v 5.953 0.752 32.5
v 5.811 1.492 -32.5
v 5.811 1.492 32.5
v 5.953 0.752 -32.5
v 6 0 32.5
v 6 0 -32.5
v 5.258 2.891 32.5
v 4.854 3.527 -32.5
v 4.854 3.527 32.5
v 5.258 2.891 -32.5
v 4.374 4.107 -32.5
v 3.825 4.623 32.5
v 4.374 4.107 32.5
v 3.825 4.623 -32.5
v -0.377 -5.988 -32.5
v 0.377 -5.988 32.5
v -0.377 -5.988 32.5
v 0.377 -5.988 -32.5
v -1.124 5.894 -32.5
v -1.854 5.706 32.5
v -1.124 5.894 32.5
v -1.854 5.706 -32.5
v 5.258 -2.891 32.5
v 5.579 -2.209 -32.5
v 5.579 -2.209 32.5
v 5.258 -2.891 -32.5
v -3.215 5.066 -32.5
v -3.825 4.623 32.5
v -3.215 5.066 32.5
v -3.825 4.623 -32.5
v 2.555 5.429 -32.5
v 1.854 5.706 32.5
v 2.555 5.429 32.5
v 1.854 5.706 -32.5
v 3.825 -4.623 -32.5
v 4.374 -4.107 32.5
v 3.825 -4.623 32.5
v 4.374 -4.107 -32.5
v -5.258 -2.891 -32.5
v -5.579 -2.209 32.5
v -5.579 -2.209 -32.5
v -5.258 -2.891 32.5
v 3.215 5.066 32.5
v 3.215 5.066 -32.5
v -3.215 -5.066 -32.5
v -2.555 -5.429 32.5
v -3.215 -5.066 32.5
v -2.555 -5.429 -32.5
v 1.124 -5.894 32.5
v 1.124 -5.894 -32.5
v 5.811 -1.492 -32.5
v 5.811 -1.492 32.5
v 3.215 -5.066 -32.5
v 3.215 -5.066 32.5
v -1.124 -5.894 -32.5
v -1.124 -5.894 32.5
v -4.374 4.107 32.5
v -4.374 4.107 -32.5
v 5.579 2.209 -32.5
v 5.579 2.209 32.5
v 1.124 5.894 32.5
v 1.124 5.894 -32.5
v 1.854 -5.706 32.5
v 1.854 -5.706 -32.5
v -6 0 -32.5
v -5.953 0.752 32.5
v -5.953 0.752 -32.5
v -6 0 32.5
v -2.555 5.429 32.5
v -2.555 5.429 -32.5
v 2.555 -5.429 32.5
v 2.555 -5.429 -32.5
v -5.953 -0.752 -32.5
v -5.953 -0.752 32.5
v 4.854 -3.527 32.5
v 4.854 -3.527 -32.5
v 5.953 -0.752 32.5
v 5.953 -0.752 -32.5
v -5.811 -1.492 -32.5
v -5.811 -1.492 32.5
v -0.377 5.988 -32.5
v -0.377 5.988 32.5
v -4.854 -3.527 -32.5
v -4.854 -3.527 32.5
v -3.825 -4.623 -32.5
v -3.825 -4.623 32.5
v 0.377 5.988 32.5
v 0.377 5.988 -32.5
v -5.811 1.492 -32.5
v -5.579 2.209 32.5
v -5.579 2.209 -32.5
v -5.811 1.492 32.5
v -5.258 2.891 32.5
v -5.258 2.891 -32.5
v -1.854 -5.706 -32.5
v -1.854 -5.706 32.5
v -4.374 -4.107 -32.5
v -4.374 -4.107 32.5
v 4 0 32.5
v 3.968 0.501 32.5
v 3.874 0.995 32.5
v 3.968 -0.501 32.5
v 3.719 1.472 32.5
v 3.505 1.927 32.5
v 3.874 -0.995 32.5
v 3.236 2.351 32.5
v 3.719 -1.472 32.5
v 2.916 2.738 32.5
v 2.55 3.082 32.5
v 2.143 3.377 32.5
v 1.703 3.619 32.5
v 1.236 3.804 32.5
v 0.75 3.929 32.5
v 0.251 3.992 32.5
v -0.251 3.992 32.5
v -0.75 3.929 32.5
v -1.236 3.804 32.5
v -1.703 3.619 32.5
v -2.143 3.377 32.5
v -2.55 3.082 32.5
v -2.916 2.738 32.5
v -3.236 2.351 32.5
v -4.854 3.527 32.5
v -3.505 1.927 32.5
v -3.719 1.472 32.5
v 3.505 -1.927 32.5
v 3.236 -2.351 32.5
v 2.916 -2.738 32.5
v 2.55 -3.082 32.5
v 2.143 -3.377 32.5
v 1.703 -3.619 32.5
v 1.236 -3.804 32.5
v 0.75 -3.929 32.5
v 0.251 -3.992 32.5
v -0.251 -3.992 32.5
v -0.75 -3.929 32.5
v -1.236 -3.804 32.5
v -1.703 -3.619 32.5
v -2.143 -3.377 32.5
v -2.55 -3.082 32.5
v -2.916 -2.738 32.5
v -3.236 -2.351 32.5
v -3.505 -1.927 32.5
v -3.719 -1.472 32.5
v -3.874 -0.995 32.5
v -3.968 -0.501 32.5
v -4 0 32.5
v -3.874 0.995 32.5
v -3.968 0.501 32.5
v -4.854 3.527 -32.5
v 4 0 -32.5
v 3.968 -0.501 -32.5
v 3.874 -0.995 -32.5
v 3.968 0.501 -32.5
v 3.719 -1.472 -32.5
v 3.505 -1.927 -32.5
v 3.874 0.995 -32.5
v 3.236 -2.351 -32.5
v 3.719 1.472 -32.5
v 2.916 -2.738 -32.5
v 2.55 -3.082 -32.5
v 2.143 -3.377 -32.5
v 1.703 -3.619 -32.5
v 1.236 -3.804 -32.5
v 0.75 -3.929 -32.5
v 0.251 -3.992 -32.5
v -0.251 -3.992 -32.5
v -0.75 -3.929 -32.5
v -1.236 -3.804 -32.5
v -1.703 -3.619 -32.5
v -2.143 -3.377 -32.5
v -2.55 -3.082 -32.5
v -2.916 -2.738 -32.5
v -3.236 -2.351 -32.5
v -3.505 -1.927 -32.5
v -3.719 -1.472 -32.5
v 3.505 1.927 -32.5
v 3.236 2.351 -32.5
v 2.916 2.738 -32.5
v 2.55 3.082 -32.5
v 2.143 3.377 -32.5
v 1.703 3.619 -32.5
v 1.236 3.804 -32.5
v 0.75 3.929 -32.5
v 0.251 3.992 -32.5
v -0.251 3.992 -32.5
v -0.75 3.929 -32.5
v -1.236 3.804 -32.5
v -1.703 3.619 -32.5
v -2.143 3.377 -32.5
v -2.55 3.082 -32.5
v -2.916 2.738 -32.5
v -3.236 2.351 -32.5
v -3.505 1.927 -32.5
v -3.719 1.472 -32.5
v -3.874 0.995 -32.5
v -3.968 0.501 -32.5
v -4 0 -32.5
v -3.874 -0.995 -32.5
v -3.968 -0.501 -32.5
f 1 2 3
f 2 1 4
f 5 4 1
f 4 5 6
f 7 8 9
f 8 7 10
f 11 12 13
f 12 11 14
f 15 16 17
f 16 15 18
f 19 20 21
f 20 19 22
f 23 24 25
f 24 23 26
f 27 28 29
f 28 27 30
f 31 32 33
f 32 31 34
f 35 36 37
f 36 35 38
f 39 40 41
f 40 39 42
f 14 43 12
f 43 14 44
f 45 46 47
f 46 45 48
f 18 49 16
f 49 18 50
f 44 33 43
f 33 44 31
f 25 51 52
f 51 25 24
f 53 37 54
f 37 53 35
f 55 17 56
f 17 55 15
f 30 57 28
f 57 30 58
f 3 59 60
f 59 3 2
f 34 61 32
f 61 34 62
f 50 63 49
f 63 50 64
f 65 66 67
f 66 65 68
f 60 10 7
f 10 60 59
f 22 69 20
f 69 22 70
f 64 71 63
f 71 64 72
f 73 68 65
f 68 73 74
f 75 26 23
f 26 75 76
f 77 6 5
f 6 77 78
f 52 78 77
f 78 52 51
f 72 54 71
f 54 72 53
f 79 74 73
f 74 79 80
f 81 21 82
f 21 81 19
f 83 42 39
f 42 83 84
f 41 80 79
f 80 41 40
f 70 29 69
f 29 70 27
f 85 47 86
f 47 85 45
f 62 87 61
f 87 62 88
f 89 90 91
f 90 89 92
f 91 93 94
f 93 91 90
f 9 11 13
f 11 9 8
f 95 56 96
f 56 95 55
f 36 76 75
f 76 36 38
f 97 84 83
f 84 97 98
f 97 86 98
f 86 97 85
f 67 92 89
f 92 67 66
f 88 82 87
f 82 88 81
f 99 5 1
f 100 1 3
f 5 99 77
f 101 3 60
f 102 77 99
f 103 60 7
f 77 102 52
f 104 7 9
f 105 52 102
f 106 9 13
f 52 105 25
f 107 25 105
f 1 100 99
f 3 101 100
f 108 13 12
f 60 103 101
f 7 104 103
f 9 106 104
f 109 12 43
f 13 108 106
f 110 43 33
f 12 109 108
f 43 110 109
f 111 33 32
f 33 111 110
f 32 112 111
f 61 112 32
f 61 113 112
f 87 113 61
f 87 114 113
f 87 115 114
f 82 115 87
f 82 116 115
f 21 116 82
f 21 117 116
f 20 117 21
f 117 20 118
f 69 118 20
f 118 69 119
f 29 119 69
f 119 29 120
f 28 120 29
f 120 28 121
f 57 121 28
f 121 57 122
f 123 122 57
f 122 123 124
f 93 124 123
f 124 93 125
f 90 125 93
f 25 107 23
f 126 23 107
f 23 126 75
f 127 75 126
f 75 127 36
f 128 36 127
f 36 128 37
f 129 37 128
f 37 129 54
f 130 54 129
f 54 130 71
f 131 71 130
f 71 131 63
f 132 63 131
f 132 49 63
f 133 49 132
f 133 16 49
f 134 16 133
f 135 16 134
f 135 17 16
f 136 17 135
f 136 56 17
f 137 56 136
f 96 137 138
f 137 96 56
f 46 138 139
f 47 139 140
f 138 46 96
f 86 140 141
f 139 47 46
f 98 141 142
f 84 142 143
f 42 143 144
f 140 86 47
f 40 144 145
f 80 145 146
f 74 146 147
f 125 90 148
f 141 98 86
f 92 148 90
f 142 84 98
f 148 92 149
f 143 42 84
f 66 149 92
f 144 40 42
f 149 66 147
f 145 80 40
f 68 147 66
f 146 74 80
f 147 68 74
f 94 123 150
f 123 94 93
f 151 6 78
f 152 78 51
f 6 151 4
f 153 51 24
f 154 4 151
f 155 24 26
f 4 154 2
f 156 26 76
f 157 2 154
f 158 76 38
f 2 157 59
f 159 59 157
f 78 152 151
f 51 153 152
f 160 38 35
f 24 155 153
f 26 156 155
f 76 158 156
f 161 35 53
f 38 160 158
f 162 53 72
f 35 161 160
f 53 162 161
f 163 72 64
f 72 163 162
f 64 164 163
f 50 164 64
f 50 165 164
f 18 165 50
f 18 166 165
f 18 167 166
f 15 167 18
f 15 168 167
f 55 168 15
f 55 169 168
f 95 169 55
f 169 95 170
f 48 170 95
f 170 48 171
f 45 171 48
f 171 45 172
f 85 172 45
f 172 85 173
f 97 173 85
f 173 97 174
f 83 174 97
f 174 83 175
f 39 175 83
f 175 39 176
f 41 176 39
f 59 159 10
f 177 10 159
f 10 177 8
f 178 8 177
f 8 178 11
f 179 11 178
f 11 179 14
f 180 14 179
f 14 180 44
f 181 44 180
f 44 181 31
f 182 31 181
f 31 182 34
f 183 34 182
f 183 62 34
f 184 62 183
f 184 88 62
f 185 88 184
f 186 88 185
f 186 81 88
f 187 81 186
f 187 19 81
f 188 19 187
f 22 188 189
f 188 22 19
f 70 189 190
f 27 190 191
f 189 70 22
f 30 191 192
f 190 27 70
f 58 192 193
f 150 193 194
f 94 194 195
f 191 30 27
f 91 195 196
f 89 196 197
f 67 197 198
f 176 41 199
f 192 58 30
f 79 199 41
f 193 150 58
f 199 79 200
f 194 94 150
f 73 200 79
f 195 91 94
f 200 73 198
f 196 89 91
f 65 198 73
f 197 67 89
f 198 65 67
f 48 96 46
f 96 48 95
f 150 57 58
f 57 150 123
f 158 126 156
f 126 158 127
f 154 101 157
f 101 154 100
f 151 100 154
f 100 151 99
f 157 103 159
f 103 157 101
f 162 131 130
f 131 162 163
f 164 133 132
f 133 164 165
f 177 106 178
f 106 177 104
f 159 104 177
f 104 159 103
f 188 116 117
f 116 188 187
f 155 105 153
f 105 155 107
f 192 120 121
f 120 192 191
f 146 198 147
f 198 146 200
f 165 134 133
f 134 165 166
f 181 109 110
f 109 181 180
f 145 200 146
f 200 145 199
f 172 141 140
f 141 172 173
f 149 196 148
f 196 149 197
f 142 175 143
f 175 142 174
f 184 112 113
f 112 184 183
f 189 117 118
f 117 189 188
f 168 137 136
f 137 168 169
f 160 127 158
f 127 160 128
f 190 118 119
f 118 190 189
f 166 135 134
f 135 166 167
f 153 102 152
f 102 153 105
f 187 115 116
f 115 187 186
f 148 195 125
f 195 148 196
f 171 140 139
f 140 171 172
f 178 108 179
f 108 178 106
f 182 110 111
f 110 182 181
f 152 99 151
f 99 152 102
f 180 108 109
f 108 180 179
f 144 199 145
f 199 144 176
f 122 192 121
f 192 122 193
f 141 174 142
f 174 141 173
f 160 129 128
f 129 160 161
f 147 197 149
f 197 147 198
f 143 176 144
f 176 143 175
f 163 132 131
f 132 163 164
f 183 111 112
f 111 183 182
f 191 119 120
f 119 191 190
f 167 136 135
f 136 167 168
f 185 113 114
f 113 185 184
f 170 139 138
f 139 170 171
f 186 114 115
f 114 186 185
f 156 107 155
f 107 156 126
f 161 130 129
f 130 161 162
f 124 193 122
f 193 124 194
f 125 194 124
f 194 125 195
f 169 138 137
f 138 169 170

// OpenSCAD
$fn = 50;


difference() {
	union() {
		translate(v = [0, 0, -32.5000000000]) {
			cylinder(h = 65, r = 6.0000000000);
		}
	}
	union() {
		translate(v = [0, 0, -100.0000000000]) {
			cylinder(h = 200, r = 4.0000000000);
		}
	}
}
